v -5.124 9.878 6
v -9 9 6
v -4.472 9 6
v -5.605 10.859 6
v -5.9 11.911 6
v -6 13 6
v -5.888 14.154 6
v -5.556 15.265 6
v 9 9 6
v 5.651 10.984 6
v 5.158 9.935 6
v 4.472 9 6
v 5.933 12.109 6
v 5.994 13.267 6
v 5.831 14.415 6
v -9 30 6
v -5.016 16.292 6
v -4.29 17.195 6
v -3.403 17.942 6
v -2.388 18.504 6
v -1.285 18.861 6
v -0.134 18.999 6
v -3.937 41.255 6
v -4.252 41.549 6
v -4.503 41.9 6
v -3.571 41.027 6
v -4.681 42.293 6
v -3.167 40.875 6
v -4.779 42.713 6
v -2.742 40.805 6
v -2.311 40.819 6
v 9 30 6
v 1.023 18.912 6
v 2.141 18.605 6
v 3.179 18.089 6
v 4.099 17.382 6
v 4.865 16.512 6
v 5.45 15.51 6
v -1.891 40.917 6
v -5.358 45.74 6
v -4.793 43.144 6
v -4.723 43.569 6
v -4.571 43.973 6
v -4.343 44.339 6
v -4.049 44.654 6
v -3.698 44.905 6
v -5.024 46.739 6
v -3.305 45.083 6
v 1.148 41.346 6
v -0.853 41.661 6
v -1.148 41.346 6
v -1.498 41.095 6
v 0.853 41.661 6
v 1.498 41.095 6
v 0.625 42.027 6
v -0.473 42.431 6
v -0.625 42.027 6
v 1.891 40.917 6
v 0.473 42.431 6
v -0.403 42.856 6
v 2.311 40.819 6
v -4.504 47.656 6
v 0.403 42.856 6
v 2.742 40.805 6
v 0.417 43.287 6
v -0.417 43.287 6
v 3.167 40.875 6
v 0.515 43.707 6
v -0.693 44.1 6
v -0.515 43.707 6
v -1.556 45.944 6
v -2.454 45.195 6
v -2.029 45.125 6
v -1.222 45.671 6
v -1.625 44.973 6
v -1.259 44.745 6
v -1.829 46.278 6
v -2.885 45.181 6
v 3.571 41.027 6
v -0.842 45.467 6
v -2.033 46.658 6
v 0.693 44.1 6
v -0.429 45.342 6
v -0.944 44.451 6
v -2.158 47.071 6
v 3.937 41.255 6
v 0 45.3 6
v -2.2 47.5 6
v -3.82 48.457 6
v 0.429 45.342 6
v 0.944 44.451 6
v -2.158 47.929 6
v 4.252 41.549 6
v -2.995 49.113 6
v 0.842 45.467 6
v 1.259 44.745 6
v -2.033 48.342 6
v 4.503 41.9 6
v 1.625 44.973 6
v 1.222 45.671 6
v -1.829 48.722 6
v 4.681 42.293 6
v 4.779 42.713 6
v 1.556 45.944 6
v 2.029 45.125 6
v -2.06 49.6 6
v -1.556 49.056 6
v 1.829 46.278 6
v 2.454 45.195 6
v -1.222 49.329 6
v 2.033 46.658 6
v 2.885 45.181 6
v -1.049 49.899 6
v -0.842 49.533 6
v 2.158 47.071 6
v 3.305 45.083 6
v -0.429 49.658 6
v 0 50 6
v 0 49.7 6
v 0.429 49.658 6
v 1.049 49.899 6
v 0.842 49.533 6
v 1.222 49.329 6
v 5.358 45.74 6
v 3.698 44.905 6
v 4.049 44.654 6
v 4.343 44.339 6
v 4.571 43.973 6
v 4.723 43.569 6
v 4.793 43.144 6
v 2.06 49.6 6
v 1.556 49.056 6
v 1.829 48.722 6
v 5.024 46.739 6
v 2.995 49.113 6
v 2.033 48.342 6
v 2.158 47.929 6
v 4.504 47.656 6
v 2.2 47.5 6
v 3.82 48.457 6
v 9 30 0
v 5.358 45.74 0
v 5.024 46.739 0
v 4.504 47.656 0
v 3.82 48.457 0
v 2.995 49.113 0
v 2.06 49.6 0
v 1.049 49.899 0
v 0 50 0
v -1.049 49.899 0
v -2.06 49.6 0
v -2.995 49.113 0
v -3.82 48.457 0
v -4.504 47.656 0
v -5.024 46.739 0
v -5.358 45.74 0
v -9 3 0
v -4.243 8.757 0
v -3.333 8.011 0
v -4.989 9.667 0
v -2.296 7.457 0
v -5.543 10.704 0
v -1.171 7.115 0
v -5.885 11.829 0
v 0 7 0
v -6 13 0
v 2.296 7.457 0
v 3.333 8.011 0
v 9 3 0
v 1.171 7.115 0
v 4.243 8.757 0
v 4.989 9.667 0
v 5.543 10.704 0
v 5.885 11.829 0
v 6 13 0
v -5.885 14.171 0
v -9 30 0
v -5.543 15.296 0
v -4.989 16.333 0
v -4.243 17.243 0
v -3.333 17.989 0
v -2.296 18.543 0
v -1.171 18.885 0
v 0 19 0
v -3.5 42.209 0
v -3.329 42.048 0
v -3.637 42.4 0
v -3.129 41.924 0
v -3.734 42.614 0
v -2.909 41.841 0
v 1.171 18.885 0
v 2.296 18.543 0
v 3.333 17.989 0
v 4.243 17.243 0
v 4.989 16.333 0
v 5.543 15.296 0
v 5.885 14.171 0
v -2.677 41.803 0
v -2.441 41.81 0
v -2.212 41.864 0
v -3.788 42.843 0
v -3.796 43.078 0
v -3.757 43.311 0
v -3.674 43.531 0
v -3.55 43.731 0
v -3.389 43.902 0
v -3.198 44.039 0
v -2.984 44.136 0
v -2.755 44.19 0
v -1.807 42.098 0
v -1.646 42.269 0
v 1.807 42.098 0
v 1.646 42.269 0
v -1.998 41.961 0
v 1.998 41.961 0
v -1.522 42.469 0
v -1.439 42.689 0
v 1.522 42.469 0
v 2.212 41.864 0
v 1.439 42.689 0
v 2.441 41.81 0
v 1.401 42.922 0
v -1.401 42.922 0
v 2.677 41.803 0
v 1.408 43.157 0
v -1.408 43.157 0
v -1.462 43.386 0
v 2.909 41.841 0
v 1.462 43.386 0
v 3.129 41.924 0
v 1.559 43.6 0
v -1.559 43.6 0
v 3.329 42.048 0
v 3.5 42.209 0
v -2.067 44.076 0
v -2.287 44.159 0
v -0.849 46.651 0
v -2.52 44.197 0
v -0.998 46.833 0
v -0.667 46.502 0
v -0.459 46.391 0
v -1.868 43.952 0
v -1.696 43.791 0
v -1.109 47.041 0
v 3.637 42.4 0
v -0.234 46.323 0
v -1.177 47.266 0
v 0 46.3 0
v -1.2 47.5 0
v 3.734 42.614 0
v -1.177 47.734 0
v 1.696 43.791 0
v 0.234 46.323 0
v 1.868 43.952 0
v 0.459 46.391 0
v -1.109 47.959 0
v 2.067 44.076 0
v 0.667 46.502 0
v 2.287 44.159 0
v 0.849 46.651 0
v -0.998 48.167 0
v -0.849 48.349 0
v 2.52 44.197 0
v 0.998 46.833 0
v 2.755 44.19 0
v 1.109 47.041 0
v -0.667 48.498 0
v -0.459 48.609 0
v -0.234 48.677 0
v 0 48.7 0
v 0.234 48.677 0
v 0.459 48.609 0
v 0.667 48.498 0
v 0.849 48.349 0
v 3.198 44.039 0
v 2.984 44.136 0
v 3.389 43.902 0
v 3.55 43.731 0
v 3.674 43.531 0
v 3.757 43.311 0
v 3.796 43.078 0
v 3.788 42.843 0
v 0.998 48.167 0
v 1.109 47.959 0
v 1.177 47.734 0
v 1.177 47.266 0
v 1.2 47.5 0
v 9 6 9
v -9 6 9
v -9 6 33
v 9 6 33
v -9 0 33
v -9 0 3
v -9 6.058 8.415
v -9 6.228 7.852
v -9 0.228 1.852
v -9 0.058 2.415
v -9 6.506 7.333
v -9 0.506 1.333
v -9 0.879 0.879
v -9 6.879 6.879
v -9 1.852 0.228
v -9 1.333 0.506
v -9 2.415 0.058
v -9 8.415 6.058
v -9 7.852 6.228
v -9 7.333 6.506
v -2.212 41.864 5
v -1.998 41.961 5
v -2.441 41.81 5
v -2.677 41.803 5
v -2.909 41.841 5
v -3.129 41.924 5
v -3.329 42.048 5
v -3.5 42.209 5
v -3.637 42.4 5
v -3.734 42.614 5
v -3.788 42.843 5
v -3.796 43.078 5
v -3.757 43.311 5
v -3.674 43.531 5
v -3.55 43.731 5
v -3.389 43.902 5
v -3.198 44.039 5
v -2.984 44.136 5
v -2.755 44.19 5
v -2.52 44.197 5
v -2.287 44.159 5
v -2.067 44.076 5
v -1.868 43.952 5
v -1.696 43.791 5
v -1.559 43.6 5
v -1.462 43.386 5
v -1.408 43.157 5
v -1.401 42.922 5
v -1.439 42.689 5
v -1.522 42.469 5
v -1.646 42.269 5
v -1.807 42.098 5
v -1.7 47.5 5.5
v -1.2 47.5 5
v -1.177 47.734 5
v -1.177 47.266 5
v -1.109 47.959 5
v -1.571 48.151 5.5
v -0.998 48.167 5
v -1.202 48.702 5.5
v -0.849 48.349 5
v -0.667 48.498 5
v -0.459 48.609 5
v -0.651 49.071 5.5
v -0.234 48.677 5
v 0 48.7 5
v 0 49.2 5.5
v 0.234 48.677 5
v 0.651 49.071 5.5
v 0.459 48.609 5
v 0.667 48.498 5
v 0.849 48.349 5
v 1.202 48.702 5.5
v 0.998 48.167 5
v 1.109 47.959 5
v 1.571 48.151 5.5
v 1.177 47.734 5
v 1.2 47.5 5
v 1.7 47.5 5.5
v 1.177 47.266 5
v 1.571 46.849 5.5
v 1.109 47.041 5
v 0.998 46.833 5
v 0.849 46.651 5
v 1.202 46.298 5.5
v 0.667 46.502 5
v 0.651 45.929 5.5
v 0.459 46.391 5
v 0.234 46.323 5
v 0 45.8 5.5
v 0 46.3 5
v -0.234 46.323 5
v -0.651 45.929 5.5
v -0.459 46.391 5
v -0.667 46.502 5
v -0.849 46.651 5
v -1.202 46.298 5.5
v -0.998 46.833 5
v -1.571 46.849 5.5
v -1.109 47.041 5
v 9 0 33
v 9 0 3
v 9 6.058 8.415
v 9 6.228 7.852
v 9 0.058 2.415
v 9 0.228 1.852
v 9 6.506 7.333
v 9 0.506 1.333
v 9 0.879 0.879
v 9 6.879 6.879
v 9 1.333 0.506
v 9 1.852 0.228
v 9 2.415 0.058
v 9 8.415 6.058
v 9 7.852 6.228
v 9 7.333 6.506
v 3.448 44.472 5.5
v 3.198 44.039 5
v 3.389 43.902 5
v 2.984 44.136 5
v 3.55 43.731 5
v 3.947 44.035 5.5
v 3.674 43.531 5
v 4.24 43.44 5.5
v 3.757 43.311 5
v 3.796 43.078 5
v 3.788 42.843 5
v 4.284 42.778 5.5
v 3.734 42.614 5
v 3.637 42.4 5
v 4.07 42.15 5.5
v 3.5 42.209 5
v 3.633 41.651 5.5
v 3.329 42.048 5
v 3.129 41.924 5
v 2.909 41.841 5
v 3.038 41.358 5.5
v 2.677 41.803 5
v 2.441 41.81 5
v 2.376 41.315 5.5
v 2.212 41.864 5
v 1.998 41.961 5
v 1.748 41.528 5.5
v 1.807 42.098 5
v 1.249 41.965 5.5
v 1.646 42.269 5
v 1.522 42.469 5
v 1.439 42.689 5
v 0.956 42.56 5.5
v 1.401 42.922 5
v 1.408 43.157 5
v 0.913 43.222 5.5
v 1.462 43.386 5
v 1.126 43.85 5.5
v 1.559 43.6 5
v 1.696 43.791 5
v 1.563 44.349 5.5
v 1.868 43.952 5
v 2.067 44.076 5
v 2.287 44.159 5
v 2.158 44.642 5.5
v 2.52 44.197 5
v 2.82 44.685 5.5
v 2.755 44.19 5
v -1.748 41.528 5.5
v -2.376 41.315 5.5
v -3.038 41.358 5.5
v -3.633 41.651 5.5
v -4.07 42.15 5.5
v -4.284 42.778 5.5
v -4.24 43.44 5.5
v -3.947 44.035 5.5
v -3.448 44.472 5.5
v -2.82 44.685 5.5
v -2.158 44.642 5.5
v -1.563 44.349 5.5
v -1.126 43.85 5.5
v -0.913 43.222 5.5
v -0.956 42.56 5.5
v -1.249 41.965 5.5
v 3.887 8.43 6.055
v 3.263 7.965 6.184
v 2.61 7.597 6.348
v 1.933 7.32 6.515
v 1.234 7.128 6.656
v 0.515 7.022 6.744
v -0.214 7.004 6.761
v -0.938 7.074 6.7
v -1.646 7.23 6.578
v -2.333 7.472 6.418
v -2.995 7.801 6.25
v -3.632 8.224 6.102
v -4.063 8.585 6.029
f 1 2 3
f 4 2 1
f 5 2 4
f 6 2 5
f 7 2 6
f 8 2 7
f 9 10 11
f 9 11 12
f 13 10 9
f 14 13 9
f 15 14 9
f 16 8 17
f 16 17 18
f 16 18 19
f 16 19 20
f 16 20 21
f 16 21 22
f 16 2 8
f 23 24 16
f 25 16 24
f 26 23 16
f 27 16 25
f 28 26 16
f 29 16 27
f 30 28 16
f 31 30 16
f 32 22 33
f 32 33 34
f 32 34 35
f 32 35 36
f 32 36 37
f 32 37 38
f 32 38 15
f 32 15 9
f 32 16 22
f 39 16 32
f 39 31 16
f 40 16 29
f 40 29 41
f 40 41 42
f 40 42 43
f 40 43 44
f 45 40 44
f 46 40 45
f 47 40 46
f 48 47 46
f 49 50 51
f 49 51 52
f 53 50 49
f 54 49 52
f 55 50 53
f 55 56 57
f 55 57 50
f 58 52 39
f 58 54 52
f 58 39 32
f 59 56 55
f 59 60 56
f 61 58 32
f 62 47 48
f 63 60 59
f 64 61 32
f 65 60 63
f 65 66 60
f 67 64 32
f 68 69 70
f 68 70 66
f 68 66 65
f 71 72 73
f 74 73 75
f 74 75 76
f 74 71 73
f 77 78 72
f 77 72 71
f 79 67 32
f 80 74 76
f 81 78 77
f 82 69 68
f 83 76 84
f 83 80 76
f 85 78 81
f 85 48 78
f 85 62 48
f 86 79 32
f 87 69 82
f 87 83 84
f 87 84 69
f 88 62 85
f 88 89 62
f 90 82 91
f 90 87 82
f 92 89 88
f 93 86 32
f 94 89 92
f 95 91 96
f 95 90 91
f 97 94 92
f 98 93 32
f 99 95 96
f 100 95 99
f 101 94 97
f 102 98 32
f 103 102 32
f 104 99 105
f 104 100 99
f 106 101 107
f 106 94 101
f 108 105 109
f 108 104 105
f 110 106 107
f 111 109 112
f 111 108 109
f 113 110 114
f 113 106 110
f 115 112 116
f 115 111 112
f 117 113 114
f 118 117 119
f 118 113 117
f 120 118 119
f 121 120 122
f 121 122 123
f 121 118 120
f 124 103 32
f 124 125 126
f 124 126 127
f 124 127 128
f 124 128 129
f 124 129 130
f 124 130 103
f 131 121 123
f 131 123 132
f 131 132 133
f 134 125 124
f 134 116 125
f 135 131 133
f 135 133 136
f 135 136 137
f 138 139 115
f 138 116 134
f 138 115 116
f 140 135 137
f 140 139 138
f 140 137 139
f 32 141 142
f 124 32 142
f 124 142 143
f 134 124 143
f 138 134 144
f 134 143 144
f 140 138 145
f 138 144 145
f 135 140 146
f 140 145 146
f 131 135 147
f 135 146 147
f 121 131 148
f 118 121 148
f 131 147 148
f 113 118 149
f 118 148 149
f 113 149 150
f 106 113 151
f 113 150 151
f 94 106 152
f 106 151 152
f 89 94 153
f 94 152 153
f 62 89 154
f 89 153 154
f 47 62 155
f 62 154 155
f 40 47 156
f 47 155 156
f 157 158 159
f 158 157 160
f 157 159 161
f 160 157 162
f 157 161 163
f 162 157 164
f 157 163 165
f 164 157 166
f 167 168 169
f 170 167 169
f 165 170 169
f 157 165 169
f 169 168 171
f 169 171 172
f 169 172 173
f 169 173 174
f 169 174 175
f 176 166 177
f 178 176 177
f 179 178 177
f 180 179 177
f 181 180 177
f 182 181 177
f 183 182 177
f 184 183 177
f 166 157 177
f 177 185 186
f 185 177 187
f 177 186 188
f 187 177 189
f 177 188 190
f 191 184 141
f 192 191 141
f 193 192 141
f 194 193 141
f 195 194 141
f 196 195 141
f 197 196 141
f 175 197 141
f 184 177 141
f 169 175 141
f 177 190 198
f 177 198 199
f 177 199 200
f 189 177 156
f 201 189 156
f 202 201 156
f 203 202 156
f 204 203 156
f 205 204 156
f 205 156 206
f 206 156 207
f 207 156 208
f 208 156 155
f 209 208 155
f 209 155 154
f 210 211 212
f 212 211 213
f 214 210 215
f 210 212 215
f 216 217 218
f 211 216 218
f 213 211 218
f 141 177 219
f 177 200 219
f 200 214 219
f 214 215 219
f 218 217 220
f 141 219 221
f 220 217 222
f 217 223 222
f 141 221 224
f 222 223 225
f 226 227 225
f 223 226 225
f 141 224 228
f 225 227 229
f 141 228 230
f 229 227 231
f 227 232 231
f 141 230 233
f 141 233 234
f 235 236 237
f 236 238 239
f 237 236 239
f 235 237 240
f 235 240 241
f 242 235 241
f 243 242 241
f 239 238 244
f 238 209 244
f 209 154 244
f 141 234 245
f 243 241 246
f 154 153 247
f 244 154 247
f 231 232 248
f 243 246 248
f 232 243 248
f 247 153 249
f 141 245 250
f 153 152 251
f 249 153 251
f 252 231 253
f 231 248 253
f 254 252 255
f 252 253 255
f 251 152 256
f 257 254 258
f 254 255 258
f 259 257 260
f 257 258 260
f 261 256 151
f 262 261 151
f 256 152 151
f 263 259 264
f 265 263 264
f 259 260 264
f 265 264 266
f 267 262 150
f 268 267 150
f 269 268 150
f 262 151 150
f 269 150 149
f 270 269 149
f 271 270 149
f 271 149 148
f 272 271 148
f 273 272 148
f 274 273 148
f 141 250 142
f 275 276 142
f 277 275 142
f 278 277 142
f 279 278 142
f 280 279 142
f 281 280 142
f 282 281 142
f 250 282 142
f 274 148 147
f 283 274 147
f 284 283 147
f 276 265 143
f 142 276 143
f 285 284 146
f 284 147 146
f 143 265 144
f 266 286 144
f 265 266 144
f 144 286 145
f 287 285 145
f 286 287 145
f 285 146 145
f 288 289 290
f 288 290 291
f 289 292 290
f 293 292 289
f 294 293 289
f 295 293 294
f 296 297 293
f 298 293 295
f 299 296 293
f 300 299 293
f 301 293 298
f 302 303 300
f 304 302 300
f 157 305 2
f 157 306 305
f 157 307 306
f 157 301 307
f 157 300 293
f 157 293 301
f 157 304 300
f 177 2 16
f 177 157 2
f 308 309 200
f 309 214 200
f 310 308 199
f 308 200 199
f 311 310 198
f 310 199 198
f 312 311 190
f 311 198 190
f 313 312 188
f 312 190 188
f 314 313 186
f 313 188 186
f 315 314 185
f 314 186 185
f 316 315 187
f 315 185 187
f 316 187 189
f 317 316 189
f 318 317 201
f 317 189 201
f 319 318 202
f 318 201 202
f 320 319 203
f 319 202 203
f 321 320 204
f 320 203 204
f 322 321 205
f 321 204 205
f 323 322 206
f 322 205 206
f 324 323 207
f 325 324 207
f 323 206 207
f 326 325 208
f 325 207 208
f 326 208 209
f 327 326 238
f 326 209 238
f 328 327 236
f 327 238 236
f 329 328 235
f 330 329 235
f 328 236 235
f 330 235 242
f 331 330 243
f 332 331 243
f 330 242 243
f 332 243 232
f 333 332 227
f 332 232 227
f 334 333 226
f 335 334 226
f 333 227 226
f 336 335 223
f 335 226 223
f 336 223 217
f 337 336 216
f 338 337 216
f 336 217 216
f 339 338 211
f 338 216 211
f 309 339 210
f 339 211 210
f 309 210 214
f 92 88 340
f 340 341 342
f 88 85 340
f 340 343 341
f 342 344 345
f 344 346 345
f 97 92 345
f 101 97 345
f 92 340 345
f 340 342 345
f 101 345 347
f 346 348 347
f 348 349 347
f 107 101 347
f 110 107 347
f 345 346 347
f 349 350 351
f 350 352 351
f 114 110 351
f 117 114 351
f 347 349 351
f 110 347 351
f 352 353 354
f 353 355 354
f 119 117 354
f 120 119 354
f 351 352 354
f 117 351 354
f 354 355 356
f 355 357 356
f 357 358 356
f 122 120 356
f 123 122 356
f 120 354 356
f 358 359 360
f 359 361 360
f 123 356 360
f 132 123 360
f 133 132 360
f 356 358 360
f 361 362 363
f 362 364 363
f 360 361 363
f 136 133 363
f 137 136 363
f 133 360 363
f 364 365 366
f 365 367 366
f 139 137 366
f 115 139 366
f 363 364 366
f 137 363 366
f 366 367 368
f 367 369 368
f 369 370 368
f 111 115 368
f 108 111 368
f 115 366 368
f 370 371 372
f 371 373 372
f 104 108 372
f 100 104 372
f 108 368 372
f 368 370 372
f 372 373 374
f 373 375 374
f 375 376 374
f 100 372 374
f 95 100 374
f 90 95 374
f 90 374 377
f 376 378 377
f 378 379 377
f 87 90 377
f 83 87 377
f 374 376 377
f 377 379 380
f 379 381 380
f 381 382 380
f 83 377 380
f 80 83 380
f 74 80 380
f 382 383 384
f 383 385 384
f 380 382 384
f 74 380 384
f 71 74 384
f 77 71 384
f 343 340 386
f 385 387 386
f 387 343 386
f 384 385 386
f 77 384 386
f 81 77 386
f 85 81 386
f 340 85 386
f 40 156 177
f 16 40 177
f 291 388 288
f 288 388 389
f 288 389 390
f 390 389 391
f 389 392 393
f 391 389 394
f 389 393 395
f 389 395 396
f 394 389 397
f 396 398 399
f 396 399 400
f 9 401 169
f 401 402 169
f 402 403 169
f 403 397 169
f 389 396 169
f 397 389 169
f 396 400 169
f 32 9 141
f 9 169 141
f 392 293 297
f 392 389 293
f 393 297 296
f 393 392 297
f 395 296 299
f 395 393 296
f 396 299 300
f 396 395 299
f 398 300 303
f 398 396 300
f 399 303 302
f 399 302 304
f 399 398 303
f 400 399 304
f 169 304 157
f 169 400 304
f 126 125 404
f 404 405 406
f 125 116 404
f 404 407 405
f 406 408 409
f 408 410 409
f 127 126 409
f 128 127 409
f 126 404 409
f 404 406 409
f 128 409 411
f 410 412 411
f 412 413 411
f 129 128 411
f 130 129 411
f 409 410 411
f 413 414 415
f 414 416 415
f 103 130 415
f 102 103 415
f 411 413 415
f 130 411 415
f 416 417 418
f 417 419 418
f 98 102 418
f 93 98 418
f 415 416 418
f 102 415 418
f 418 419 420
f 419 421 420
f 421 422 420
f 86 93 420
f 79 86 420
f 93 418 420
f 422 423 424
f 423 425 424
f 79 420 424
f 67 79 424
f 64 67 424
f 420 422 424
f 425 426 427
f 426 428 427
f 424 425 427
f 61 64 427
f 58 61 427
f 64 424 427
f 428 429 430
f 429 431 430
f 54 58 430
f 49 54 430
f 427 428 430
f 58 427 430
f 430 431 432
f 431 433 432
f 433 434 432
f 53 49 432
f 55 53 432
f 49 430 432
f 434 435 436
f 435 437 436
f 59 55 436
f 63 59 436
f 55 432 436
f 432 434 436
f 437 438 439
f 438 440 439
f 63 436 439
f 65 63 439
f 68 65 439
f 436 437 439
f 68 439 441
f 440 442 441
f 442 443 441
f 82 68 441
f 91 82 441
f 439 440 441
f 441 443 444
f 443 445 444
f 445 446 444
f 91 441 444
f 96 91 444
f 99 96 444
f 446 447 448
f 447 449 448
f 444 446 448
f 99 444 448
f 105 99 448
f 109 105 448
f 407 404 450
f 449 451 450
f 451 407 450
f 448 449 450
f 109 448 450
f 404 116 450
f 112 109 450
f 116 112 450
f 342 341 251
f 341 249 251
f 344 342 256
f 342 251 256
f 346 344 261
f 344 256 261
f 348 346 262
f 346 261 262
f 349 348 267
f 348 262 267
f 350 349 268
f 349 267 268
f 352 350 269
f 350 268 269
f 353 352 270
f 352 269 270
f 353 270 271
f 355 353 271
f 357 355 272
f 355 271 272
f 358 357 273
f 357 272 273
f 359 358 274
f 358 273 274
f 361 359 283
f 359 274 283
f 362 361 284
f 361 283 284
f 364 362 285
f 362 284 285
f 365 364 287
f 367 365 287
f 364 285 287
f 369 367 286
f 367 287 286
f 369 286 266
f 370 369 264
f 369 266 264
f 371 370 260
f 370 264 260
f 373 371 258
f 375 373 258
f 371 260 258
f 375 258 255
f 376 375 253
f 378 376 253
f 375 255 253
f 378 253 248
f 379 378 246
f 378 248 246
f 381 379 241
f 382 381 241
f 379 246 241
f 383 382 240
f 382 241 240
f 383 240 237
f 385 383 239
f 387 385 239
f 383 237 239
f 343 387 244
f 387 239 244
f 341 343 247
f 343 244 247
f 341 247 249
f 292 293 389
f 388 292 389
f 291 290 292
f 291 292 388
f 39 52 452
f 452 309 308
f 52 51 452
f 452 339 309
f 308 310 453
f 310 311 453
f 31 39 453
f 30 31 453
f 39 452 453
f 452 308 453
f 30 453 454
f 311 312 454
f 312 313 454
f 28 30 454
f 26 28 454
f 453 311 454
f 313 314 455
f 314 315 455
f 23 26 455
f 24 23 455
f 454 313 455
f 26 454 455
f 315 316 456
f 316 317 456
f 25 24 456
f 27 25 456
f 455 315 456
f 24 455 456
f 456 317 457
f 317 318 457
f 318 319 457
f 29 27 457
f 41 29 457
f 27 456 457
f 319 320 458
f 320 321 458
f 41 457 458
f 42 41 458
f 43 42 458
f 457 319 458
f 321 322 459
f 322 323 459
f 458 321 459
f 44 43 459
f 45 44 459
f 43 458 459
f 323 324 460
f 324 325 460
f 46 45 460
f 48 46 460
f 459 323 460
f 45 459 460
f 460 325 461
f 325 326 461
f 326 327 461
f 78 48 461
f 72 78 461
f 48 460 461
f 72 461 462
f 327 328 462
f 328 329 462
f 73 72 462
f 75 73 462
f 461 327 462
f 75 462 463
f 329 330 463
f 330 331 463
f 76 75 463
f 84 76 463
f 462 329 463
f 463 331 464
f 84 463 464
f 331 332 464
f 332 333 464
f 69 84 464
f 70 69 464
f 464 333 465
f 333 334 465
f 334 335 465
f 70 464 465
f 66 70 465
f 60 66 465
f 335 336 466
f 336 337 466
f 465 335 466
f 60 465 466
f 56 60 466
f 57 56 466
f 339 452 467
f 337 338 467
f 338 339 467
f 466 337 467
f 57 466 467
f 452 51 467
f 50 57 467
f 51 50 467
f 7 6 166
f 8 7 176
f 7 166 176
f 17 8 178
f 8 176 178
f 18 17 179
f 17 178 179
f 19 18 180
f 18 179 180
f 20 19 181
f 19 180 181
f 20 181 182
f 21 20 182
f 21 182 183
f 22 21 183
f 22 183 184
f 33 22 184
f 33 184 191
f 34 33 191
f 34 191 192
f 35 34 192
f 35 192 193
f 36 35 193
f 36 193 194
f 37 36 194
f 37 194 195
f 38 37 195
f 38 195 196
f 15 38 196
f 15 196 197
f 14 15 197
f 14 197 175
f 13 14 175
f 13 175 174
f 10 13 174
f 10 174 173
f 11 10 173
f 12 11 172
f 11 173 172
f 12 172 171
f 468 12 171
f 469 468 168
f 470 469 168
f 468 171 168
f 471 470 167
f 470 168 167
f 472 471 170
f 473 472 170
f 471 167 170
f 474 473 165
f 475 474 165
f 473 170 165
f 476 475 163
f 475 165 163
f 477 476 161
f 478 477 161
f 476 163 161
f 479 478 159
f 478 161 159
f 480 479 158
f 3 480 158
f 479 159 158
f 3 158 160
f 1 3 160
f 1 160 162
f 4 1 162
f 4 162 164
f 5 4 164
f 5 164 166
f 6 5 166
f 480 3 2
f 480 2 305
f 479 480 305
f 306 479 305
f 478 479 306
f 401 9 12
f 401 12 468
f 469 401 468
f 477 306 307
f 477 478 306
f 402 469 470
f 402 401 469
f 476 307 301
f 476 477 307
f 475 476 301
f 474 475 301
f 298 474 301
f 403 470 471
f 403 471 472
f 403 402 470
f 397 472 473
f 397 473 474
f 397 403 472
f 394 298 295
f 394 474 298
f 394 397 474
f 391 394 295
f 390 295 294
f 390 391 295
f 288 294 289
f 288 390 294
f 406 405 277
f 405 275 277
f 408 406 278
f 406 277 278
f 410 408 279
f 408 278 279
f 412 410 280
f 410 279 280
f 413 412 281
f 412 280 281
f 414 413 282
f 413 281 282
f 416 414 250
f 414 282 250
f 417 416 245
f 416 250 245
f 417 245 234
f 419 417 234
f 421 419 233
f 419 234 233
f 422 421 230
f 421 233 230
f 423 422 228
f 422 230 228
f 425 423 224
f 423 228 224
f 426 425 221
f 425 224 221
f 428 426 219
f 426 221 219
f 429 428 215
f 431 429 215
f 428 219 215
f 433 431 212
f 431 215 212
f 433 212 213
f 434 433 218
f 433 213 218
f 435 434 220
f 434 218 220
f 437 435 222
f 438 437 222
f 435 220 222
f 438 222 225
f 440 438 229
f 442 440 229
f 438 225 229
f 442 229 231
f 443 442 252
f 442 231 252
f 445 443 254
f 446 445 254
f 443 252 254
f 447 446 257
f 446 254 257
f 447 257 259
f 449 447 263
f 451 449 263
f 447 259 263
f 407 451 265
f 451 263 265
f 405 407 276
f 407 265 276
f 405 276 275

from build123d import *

# Parameters (mm, degrees)
RESSALTO_EXTRUS_O1_DEPTH                             = 6
ESBO_O2_W                                            = 18
ESBO_O2_H                                            = 6
RESSALTO_EXTRUS_O2_DEPTH                             = 27
FILETE1_R                                            = 3
ESBO_O4_R                                            = 6
CORTE_EXTRUS_O1_DEPTH                                = 33
ESCAREADO_PARA_PARAFUSO_DE_M_QUINA_COM_C_D           = 2.4
ESCAREADO_PARA_PARAFUSO_DE_M_QUINA_COM_C_CSINK_D     = 4.4
ESCAREADO_PARA_PARAFUSO_DE_M_QUINA_COM_C_CSINK_ANGLE = 90
PADR_OCIRCULAR1_COUNT                                = 3


with BuildPart() as part:
    # Esboço1 → Ressalto-extrusão1 (new body)
    with BuildSketch(Plane.XY):
        with BuildLine():
            Line((-9, 30), (-9, 0))
            Line((-9, 0), (9, 0))
            Line((9, 0), (9, 30))
            Line((9, 30), (5.358457271, 45.739732099))
            ThreePointArc((5.358457271, 45.739732099), (0, 50), (-5.358457271, 45.739732099))
            Line((-5.358457271, 45.739732099), (-9, 30))
        make_face()
    extrude(amount=RESSALTO_EXTRUS_O1_DEPTH)

    # Esboço2 → Ressalto-extrusão2 (add)
    with BuildSketch(Plane.XY.offset(6)):
        with Locations((0, 3)):
            Rectangle(ESBO_O2_W, ESBO_O2_H)
    extrude(amount=RESSALTO_EXTRUS_O2_DEPTH)

    # Filete1
    filete1_edges = [part.edges().sort_by_distance(p)[0] for p in [
        (0, 6, 6),
        (0, 0, 0),
    ]]
    fillet(filete1_edges, radius=FILETE1_R)

    # Esboço4 → Corte-extrusão1 (cut)
    with BuildSketch(Plane(origin=(0, 0, 0), x_dir=(-1, 0, 0), z_dir=(0, 0, -1))):
        with Locations((0, 13)):
            Circle(ESBO_O4_R)
    extrude(amount=-CORTE_EXTRUS_O1_DEPTH, mode=Mode.SUBTRACT)

    # Escareado para parafuso de máquina com cabeça chata de M22 (through all)
    with Locations(Plane(origin=(0, 47.5, 6), x_dir=(1, 0, 0), z_dir=(0, 0, 1))):
        with Locations((0, 0)):
            escareado_para_parafuso_de_m_quina_com_c = CounterSinkHole(ESCAREADO_PARA_PARAFUSO_DE_M_QUINA_COM_C_D / 2, ESCAREADO_PARA_PARAFUSO_DE_M_QUINA_COM_C_CSINK_D / 2, counter_sink_angle=ESCAREADO_PARA_PARAFUSO_DE_M_QUINA_COM_C_CSINK_ANGLE)

    # PadrãoCircular1: Escareado para parafuso de máquina com cabeça chata de M22 ×3 about axis
    padr_ocircular1_axis = Axis((0, 44.5, 0), (0, 0, 1))
    for i in range(1, PADR_OCIRCULAR1_COUNT):
        add(escareado_para_parafuso_de_m_quina_com_c.rotate(padr_ocircular1_axis, i * 360 / PADR_OCIRCULAR1_COUNT), mode=Mode.SUBTRACT)


solid = part.part
